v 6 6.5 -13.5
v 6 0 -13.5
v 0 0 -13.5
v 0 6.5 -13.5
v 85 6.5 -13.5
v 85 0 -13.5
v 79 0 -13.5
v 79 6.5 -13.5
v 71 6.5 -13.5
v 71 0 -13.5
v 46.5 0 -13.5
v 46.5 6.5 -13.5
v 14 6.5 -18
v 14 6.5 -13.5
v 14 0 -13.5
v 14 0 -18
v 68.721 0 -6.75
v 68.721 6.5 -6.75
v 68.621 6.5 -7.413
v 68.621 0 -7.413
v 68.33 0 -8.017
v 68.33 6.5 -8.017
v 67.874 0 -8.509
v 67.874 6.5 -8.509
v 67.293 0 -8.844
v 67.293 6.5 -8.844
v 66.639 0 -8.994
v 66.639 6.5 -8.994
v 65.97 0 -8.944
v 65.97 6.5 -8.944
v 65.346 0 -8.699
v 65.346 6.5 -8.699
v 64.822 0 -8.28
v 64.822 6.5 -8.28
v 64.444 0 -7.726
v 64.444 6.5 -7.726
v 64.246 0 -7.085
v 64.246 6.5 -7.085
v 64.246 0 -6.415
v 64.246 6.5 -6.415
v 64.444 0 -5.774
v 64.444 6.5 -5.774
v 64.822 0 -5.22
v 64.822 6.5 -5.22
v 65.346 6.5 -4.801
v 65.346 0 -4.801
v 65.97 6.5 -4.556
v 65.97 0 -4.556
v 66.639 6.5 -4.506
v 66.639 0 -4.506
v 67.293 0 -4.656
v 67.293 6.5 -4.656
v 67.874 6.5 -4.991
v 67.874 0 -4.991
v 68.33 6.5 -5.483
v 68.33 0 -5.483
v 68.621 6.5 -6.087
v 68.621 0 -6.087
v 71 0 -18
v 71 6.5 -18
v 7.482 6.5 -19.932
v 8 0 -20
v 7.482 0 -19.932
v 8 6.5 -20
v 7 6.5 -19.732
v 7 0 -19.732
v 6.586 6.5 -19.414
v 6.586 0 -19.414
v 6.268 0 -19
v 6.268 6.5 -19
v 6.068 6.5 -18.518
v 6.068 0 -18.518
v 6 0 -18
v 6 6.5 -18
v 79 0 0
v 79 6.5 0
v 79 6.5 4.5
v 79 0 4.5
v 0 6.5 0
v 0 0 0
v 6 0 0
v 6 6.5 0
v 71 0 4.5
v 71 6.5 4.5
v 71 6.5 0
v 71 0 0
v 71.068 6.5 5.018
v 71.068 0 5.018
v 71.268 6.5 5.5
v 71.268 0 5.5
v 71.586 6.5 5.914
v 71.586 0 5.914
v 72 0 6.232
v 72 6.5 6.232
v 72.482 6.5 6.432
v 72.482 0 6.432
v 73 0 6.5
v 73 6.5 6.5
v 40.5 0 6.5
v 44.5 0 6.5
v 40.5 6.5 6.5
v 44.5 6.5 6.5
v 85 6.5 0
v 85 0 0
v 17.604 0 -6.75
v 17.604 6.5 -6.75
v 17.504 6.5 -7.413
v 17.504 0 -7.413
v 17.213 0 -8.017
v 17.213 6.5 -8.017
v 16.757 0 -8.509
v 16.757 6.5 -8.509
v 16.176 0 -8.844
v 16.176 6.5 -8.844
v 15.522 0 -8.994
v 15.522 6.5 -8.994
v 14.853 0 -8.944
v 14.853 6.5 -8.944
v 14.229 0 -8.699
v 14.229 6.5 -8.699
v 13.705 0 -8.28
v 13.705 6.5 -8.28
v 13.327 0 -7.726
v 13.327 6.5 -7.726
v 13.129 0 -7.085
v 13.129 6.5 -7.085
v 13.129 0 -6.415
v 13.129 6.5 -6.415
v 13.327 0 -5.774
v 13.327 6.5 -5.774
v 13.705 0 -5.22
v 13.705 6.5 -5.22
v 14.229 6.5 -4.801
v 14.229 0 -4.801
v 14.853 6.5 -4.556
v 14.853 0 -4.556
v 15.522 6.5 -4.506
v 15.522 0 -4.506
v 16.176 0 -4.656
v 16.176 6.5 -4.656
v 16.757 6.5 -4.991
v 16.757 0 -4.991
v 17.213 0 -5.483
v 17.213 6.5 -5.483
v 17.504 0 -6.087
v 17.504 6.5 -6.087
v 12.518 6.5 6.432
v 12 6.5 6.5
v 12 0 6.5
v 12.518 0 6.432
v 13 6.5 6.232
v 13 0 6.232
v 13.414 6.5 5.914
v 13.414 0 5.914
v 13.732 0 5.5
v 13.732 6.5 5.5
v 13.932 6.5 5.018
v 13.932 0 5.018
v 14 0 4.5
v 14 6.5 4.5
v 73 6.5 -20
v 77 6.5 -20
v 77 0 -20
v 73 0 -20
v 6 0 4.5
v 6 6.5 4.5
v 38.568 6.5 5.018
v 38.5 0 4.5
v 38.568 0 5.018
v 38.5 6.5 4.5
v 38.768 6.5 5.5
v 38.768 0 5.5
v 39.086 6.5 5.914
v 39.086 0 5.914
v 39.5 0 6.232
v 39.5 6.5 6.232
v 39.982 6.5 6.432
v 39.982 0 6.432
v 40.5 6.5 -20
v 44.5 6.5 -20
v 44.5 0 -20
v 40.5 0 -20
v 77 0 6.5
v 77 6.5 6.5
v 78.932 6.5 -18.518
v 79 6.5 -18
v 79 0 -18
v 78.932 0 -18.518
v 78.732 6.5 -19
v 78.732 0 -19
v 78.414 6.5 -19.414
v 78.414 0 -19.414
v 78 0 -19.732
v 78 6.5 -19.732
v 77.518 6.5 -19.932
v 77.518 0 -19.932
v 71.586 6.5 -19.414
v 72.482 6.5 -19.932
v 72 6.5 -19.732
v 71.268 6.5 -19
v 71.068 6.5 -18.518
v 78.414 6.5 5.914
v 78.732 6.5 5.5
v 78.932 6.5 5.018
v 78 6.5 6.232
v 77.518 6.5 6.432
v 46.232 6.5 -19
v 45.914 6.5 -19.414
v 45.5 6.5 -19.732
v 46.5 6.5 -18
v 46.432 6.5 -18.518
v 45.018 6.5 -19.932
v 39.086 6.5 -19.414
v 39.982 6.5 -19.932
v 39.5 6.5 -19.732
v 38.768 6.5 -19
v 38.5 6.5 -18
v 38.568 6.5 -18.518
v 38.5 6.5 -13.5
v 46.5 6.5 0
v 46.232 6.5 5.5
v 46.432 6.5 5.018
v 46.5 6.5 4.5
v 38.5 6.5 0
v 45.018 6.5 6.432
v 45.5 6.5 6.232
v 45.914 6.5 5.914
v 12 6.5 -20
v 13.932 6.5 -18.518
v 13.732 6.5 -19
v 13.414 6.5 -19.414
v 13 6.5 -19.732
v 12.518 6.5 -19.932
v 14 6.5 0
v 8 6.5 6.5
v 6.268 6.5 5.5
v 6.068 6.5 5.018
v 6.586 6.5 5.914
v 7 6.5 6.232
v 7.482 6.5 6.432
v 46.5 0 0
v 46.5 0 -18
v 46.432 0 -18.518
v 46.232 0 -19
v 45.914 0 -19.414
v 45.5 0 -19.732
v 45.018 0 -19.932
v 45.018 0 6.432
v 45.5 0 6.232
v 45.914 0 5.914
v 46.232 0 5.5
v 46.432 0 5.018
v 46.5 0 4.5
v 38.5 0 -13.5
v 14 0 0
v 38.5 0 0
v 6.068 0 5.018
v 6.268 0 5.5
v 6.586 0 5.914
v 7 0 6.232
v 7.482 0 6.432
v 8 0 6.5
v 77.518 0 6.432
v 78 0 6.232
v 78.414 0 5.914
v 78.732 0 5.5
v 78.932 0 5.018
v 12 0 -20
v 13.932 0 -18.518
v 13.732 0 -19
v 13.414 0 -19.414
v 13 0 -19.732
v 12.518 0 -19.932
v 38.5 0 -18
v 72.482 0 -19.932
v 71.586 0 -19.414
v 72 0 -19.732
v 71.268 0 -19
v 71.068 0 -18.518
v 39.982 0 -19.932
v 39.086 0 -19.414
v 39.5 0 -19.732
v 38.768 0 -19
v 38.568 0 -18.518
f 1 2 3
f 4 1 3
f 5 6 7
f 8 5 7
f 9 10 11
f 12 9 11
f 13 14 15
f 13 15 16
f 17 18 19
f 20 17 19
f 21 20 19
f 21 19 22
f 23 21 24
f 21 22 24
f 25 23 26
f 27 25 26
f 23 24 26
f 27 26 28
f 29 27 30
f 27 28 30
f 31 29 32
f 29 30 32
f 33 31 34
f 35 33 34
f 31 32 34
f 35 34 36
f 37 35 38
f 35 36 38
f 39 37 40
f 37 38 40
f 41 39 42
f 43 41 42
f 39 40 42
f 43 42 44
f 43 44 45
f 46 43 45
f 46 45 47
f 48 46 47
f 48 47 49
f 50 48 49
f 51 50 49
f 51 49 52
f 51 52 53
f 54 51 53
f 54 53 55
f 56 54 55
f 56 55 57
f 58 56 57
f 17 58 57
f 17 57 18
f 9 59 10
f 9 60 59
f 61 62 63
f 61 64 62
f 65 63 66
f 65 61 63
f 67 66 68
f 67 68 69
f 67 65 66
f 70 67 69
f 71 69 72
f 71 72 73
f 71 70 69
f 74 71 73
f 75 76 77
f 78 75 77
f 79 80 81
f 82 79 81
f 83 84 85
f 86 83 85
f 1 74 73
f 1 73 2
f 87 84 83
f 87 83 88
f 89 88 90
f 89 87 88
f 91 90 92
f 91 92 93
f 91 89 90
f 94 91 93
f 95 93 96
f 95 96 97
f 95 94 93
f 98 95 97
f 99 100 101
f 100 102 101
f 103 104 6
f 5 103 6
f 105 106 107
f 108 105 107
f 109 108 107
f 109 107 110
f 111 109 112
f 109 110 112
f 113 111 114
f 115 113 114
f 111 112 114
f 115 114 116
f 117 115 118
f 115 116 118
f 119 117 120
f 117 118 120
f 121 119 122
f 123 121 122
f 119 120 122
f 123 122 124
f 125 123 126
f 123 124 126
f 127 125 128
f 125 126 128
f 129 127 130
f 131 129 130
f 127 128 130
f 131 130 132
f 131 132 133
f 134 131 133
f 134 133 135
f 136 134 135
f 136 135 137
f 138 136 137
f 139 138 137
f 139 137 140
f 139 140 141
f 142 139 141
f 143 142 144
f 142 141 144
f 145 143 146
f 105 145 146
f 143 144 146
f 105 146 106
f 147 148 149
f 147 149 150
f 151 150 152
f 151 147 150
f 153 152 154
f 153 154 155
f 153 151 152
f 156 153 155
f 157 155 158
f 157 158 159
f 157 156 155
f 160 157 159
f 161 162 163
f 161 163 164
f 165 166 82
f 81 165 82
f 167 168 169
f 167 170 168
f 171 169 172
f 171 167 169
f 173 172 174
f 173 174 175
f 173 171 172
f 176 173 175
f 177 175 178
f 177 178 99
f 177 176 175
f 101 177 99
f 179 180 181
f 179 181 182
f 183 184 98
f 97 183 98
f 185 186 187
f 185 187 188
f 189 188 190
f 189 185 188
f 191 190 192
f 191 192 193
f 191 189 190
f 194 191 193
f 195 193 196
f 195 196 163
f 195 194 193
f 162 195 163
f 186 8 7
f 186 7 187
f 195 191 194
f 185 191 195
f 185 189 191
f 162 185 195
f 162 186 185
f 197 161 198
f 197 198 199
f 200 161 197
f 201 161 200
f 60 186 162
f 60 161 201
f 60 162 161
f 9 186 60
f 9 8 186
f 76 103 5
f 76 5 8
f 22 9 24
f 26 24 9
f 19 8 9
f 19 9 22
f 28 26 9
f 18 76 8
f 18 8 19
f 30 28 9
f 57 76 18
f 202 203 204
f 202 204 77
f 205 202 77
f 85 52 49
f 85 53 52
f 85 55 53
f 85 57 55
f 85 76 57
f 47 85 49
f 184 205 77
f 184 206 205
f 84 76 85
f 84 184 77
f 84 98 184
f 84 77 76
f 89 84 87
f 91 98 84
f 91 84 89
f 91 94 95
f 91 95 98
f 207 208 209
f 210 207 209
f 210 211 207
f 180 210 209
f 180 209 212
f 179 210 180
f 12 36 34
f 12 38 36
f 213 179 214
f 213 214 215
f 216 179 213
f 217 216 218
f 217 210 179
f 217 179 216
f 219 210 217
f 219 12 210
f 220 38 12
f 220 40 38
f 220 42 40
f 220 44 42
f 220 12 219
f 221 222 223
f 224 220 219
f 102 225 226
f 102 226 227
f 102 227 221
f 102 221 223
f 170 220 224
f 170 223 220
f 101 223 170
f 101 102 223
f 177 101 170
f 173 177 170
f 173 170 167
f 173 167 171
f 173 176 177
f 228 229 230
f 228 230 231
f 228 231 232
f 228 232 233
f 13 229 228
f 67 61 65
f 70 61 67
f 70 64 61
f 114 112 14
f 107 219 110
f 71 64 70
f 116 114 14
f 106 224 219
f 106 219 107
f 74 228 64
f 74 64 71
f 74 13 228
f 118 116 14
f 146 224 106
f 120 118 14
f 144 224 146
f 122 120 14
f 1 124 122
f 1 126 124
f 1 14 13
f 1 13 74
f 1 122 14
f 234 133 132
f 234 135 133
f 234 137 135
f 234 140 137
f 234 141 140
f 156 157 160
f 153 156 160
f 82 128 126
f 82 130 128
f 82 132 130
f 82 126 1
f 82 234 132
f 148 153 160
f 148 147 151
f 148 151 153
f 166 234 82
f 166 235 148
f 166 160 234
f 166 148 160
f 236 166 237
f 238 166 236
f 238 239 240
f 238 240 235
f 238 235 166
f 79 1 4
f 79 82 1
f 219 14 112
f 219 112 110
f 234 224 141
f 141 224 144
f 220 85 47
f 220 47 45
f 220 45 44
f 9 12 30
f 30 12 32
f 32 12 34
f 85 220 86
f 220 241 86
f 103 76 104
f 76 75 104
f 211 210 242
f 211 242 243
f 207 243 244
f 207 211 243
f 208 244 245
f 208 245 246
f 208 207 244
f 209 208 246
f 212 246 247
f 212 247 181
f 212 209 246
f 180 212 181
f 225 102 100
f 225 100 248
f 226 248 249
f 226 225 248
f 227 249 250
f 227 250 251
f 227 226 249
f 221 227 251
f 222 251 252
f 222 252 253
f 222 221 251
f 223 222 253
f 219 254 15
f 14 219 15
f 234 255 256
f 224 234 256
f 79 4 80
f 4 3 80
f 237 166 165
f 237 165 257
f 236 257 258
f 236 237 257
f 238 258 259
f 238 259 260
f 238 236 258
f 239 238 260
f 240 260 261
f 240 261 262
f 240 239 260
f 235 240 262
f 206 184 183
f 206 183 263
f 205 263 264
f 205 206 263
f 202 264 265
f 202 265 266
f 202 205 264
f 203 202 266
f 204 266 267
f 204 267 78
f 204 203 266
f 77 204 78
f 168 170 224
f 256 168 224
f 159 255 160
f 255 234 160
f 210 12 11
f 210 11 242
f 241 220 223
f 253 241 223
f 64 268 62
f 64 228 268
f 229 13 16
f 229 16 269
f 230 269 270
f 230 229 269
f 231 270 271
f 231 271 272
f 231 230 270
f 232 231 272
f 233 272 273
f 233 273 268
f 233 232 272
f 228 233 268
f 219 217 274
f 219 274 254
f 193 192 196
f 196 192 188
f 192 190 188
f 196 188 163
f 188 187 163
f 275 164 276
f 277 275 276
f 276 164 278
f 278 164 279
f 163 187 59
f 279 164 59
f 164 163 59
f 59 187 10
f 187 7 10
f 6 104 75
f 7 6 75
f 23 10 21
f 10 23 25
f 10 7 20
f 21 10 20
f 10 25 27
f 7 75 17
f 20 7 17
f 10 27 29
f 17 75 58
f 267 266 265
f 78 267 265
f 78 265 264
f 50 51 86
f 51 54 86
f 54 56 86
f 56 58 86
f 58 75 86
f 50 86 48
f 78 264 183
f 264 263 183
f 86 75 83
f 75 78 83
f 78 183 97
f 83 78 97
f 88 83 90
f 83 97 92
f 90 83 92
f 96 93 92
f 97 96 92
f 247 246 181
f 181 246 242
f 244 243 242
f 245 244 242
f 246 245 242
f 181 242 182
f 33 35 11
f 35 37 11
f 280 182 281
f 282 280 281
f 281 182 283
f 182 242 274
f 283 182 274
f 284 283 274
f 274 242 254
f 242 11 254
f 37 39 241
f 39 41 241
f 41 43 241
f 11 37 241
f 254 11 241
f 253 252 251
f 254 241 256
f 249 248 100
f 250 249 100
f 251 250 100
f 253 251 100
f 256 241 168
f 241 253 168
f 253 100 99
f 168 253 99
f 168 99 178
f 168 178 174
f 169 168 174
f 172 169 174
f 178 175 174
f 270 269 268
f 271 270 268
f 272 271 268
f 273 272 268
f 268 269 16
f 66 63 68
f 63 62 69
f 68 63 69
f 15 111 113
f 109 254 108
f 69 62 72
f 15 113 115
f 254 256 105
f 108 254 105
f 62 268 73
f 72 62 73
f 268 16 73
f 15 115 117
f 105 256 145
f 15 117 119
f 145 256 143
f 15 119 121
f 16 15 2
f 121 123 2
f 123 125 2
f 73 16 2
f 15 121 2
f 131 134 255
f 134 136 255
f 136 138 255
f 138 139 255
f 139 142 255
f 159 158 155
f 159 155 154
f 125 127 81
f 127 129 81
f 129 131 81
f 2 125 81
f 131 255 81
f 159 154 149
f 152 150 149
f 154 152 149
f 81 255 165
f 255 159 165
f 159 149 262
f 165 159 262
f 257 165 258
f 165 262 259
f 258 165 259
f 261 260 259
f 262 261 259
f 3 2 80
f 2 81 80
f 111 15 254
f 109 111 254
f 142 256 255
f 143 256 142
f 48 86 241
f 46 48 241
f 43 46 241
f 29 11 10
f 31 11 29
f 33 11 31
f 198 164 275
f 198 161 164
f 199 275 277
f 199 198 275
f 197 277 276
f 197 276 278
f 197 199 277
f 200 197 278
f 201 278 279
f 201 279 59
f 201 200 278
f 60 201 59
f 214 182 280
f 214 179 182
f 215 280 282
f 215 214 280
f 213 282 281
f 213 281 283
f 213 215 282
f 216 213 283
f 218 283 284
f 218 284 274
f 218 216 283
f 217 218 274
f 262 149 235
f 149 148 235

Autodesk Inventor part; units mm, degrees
ref_plane "YZ Plane" through (0, 0, 0) normal (1, 0, 0) x (0, 1, 0)
ref_plane "XZ Plane" through (0, 0, 0) normal (0, 1, 0) x (-1, 0, 0)
ref_plane "XY Plane" through (0, 0, 0) normal (0, 0, 1) x (1, 0, 0)
sketch "Sketch1" plane through (0, 0, 0) normal (0, 1, 0) x (-1, 0, 0)
  line L0 (0, 0) -> (-85, 0)
  line L1 (-85, 0) -> (-85, -13.5)
  line L2 (-85, -13.5) -> (0, -13.5)
  line L3 (0, -13.5) -> (0, 0)
  dimension "d0" = 85
  dimension "d1" = 13.5
extrude "Extrusion1" add sketch "Sketch1" along normal blind 6.5
sketch "Sketch2" plane through (0, 6.5, 0) normal (0, 1, 0) x (1, 0, 0)
  line L0 (0, 0) -> (85, 0) projected
  line L1 (85, 0) -> (85, 13.5) projected
  line L2 (85, 13.5) -> (0, 13.5) projected
  line L3 (0, 13.5) -> (0, 0) projected
  line L4 (6, 13.5) -> (14, 13.5)
  line L5 (14, 13.5) -> (14, 18)
  line L6 (12, 20) -> (8, 20)
  line L7 (6, 18) -> (6, 13.5)
  line L8 (38.5, 13.5) -> (46.5, 13.5)
  line L9 (46.5, 13.5) -> (46.5, 18)
  line L10 (44.5, 20) -> (40.5, 20)
  line L11 (38.5, 18) -> (38.5, 13.5)
  line L12 (71, 13.5) -> (79, 13.5)
  line L13 (79, 13.5) -> (79, 18)
  line L14 (77, 20) -> (73, 20)
  line L15 (71, 18) -> (71, 13.5)
  line L16 (6, 0) -> (14, 0)
  line L17 (14, 0) -> (14, -4.5)
  line L18 (12, -6.5) -> (8, -6.5)
  line L19 (6, -4.5) -> (6, 0)
  line L20 (38.5, 0) -> (46.5, 0)
  line L21 (46.5, 0) -> (46.5, -4.5)
  line L22 (44.5, -6.5) -> (40.5, -6.5)
  line L23 (38.5, -4.5) -> (38.5, 0)
  line L24 (71, 0) -> (79, 0)
  line L25 (79, 0) -> (79, -4.5)
  line L26 (77, -6.5) -> (73, -6.5)
  line L27 (71, -4.5) -> (71, 0)
  arc A0 (8, 20) -> (6, 18) centre (8, 18) ccw
  arc A1 (14, 18) -> (12, 20) centre (12, 18) ccw
  arc A2 (40.5, 20) -> (38.5, 18) centre (40.5, 18) ccw
  arc A3 (46.5, 18) -> (44.5, 20) centre (44.5, 18) ccw
  arc A4 (73, 20) -> (71, 18) centre (73, 18) ccw
  arc A5 (79, 18) -> (77, 20) centre (77, 18) ccw
  arc A6 (6, -4.5) -> (8, -6.5) centre (8, -4.5) ccw
  arc A7 (12, -6.5) -> (14, -4.5) centre (12, -4.5) ccw
  arc A8 (38.5, -4.5) -> (40.5, -6.5) centre (40.5, -4.5) ccw
  arc A9 (44.5, -6.5) -> (46.5, -4.5) centre (44.5, -4.5) ccw
  arc A10 (71, -4.5) -> (73, -6.5) centre (73, -4.5) ccw
  arc A11 (77, -6.5) -> (79, -4.5) centre (77, -4.5) ccw
  line L28 (14, 15.75) -> (38.5, 15.75) construction
  line L29 (46.5, 15.75) -> (71, 15.75) construction
  dimension "d4" = 2
  dimension "d5" = 8
  dimension "d6" = 8
  dimension "d7" = 8
  dimension "d8" = 6.5
  dimension "d9" = 6.5
  dimension "d10" = 6
  dimension "d11" = 6
extrude "Extrusion2" add sketch "Sketch2" against normal blind 6.5 contours L0 L17 A7 L18 A6 L19 | L7 A0 L6 A1 L5 L2 | L0 L21 A9 L22 A8 L23 | L11 A2 L10 A3 L9 L2 | L0 L25 A11 L26 A10 L27 | L15 A4 L14 A5 L13 L2
sketch "Sketch4" plane through (0, 6.5, 0) normal (0, 1, 0) x (1, 0, 0)
  line L0 (85, 0) -> (85, 13.5) projected
  circle A0 centre (66.4711, 6.75) radius 2.25
  line L1 (46.5, 0) -> (71, 0) projected
  line L2 (85, 0) -> (0, -27.6346) construction
  line L3 (71, 13.5) -> (46.5, 13.5) projected
  line L4 (70.2271, -4.8028) -> (64.2766, 13.5) construction
  point P0 (85, 6.75)
  point P1 (0, 0)
  dimension "d14" = 4.5
  dimension "d18" = 18.01
  dimension "d19" = 15.534
extrude "Extrusion3" cut sketch "Sketch4" against normal through all
sketch "Sketch5" plane through (0, 6.5, 0) normal (0, 1, 0) x (1, 0, 0)
  circle A0 centre (66.4711, 6.75) radius 2.25 projected
  line L0 (85, 0) -> (85, 13.5) projected
  line L1 (0, 13.5) -> (0, 0) projected
  circle A1 centre (15.354, 6.75) radius 2.25
  point P0 (0, 6.75)
  dimension "d22" = 69.646
extrude "Extrusion4" cut sketch "Sketch5" against normal through all contours A1
equation "\"d6\" = d5"
equation "\"d7\" = d6"
equation "\"d9\" = d8"
equation "\"d11\" = d10"
properties part number "z_pulley_holder" material "Plywood, Finish"
